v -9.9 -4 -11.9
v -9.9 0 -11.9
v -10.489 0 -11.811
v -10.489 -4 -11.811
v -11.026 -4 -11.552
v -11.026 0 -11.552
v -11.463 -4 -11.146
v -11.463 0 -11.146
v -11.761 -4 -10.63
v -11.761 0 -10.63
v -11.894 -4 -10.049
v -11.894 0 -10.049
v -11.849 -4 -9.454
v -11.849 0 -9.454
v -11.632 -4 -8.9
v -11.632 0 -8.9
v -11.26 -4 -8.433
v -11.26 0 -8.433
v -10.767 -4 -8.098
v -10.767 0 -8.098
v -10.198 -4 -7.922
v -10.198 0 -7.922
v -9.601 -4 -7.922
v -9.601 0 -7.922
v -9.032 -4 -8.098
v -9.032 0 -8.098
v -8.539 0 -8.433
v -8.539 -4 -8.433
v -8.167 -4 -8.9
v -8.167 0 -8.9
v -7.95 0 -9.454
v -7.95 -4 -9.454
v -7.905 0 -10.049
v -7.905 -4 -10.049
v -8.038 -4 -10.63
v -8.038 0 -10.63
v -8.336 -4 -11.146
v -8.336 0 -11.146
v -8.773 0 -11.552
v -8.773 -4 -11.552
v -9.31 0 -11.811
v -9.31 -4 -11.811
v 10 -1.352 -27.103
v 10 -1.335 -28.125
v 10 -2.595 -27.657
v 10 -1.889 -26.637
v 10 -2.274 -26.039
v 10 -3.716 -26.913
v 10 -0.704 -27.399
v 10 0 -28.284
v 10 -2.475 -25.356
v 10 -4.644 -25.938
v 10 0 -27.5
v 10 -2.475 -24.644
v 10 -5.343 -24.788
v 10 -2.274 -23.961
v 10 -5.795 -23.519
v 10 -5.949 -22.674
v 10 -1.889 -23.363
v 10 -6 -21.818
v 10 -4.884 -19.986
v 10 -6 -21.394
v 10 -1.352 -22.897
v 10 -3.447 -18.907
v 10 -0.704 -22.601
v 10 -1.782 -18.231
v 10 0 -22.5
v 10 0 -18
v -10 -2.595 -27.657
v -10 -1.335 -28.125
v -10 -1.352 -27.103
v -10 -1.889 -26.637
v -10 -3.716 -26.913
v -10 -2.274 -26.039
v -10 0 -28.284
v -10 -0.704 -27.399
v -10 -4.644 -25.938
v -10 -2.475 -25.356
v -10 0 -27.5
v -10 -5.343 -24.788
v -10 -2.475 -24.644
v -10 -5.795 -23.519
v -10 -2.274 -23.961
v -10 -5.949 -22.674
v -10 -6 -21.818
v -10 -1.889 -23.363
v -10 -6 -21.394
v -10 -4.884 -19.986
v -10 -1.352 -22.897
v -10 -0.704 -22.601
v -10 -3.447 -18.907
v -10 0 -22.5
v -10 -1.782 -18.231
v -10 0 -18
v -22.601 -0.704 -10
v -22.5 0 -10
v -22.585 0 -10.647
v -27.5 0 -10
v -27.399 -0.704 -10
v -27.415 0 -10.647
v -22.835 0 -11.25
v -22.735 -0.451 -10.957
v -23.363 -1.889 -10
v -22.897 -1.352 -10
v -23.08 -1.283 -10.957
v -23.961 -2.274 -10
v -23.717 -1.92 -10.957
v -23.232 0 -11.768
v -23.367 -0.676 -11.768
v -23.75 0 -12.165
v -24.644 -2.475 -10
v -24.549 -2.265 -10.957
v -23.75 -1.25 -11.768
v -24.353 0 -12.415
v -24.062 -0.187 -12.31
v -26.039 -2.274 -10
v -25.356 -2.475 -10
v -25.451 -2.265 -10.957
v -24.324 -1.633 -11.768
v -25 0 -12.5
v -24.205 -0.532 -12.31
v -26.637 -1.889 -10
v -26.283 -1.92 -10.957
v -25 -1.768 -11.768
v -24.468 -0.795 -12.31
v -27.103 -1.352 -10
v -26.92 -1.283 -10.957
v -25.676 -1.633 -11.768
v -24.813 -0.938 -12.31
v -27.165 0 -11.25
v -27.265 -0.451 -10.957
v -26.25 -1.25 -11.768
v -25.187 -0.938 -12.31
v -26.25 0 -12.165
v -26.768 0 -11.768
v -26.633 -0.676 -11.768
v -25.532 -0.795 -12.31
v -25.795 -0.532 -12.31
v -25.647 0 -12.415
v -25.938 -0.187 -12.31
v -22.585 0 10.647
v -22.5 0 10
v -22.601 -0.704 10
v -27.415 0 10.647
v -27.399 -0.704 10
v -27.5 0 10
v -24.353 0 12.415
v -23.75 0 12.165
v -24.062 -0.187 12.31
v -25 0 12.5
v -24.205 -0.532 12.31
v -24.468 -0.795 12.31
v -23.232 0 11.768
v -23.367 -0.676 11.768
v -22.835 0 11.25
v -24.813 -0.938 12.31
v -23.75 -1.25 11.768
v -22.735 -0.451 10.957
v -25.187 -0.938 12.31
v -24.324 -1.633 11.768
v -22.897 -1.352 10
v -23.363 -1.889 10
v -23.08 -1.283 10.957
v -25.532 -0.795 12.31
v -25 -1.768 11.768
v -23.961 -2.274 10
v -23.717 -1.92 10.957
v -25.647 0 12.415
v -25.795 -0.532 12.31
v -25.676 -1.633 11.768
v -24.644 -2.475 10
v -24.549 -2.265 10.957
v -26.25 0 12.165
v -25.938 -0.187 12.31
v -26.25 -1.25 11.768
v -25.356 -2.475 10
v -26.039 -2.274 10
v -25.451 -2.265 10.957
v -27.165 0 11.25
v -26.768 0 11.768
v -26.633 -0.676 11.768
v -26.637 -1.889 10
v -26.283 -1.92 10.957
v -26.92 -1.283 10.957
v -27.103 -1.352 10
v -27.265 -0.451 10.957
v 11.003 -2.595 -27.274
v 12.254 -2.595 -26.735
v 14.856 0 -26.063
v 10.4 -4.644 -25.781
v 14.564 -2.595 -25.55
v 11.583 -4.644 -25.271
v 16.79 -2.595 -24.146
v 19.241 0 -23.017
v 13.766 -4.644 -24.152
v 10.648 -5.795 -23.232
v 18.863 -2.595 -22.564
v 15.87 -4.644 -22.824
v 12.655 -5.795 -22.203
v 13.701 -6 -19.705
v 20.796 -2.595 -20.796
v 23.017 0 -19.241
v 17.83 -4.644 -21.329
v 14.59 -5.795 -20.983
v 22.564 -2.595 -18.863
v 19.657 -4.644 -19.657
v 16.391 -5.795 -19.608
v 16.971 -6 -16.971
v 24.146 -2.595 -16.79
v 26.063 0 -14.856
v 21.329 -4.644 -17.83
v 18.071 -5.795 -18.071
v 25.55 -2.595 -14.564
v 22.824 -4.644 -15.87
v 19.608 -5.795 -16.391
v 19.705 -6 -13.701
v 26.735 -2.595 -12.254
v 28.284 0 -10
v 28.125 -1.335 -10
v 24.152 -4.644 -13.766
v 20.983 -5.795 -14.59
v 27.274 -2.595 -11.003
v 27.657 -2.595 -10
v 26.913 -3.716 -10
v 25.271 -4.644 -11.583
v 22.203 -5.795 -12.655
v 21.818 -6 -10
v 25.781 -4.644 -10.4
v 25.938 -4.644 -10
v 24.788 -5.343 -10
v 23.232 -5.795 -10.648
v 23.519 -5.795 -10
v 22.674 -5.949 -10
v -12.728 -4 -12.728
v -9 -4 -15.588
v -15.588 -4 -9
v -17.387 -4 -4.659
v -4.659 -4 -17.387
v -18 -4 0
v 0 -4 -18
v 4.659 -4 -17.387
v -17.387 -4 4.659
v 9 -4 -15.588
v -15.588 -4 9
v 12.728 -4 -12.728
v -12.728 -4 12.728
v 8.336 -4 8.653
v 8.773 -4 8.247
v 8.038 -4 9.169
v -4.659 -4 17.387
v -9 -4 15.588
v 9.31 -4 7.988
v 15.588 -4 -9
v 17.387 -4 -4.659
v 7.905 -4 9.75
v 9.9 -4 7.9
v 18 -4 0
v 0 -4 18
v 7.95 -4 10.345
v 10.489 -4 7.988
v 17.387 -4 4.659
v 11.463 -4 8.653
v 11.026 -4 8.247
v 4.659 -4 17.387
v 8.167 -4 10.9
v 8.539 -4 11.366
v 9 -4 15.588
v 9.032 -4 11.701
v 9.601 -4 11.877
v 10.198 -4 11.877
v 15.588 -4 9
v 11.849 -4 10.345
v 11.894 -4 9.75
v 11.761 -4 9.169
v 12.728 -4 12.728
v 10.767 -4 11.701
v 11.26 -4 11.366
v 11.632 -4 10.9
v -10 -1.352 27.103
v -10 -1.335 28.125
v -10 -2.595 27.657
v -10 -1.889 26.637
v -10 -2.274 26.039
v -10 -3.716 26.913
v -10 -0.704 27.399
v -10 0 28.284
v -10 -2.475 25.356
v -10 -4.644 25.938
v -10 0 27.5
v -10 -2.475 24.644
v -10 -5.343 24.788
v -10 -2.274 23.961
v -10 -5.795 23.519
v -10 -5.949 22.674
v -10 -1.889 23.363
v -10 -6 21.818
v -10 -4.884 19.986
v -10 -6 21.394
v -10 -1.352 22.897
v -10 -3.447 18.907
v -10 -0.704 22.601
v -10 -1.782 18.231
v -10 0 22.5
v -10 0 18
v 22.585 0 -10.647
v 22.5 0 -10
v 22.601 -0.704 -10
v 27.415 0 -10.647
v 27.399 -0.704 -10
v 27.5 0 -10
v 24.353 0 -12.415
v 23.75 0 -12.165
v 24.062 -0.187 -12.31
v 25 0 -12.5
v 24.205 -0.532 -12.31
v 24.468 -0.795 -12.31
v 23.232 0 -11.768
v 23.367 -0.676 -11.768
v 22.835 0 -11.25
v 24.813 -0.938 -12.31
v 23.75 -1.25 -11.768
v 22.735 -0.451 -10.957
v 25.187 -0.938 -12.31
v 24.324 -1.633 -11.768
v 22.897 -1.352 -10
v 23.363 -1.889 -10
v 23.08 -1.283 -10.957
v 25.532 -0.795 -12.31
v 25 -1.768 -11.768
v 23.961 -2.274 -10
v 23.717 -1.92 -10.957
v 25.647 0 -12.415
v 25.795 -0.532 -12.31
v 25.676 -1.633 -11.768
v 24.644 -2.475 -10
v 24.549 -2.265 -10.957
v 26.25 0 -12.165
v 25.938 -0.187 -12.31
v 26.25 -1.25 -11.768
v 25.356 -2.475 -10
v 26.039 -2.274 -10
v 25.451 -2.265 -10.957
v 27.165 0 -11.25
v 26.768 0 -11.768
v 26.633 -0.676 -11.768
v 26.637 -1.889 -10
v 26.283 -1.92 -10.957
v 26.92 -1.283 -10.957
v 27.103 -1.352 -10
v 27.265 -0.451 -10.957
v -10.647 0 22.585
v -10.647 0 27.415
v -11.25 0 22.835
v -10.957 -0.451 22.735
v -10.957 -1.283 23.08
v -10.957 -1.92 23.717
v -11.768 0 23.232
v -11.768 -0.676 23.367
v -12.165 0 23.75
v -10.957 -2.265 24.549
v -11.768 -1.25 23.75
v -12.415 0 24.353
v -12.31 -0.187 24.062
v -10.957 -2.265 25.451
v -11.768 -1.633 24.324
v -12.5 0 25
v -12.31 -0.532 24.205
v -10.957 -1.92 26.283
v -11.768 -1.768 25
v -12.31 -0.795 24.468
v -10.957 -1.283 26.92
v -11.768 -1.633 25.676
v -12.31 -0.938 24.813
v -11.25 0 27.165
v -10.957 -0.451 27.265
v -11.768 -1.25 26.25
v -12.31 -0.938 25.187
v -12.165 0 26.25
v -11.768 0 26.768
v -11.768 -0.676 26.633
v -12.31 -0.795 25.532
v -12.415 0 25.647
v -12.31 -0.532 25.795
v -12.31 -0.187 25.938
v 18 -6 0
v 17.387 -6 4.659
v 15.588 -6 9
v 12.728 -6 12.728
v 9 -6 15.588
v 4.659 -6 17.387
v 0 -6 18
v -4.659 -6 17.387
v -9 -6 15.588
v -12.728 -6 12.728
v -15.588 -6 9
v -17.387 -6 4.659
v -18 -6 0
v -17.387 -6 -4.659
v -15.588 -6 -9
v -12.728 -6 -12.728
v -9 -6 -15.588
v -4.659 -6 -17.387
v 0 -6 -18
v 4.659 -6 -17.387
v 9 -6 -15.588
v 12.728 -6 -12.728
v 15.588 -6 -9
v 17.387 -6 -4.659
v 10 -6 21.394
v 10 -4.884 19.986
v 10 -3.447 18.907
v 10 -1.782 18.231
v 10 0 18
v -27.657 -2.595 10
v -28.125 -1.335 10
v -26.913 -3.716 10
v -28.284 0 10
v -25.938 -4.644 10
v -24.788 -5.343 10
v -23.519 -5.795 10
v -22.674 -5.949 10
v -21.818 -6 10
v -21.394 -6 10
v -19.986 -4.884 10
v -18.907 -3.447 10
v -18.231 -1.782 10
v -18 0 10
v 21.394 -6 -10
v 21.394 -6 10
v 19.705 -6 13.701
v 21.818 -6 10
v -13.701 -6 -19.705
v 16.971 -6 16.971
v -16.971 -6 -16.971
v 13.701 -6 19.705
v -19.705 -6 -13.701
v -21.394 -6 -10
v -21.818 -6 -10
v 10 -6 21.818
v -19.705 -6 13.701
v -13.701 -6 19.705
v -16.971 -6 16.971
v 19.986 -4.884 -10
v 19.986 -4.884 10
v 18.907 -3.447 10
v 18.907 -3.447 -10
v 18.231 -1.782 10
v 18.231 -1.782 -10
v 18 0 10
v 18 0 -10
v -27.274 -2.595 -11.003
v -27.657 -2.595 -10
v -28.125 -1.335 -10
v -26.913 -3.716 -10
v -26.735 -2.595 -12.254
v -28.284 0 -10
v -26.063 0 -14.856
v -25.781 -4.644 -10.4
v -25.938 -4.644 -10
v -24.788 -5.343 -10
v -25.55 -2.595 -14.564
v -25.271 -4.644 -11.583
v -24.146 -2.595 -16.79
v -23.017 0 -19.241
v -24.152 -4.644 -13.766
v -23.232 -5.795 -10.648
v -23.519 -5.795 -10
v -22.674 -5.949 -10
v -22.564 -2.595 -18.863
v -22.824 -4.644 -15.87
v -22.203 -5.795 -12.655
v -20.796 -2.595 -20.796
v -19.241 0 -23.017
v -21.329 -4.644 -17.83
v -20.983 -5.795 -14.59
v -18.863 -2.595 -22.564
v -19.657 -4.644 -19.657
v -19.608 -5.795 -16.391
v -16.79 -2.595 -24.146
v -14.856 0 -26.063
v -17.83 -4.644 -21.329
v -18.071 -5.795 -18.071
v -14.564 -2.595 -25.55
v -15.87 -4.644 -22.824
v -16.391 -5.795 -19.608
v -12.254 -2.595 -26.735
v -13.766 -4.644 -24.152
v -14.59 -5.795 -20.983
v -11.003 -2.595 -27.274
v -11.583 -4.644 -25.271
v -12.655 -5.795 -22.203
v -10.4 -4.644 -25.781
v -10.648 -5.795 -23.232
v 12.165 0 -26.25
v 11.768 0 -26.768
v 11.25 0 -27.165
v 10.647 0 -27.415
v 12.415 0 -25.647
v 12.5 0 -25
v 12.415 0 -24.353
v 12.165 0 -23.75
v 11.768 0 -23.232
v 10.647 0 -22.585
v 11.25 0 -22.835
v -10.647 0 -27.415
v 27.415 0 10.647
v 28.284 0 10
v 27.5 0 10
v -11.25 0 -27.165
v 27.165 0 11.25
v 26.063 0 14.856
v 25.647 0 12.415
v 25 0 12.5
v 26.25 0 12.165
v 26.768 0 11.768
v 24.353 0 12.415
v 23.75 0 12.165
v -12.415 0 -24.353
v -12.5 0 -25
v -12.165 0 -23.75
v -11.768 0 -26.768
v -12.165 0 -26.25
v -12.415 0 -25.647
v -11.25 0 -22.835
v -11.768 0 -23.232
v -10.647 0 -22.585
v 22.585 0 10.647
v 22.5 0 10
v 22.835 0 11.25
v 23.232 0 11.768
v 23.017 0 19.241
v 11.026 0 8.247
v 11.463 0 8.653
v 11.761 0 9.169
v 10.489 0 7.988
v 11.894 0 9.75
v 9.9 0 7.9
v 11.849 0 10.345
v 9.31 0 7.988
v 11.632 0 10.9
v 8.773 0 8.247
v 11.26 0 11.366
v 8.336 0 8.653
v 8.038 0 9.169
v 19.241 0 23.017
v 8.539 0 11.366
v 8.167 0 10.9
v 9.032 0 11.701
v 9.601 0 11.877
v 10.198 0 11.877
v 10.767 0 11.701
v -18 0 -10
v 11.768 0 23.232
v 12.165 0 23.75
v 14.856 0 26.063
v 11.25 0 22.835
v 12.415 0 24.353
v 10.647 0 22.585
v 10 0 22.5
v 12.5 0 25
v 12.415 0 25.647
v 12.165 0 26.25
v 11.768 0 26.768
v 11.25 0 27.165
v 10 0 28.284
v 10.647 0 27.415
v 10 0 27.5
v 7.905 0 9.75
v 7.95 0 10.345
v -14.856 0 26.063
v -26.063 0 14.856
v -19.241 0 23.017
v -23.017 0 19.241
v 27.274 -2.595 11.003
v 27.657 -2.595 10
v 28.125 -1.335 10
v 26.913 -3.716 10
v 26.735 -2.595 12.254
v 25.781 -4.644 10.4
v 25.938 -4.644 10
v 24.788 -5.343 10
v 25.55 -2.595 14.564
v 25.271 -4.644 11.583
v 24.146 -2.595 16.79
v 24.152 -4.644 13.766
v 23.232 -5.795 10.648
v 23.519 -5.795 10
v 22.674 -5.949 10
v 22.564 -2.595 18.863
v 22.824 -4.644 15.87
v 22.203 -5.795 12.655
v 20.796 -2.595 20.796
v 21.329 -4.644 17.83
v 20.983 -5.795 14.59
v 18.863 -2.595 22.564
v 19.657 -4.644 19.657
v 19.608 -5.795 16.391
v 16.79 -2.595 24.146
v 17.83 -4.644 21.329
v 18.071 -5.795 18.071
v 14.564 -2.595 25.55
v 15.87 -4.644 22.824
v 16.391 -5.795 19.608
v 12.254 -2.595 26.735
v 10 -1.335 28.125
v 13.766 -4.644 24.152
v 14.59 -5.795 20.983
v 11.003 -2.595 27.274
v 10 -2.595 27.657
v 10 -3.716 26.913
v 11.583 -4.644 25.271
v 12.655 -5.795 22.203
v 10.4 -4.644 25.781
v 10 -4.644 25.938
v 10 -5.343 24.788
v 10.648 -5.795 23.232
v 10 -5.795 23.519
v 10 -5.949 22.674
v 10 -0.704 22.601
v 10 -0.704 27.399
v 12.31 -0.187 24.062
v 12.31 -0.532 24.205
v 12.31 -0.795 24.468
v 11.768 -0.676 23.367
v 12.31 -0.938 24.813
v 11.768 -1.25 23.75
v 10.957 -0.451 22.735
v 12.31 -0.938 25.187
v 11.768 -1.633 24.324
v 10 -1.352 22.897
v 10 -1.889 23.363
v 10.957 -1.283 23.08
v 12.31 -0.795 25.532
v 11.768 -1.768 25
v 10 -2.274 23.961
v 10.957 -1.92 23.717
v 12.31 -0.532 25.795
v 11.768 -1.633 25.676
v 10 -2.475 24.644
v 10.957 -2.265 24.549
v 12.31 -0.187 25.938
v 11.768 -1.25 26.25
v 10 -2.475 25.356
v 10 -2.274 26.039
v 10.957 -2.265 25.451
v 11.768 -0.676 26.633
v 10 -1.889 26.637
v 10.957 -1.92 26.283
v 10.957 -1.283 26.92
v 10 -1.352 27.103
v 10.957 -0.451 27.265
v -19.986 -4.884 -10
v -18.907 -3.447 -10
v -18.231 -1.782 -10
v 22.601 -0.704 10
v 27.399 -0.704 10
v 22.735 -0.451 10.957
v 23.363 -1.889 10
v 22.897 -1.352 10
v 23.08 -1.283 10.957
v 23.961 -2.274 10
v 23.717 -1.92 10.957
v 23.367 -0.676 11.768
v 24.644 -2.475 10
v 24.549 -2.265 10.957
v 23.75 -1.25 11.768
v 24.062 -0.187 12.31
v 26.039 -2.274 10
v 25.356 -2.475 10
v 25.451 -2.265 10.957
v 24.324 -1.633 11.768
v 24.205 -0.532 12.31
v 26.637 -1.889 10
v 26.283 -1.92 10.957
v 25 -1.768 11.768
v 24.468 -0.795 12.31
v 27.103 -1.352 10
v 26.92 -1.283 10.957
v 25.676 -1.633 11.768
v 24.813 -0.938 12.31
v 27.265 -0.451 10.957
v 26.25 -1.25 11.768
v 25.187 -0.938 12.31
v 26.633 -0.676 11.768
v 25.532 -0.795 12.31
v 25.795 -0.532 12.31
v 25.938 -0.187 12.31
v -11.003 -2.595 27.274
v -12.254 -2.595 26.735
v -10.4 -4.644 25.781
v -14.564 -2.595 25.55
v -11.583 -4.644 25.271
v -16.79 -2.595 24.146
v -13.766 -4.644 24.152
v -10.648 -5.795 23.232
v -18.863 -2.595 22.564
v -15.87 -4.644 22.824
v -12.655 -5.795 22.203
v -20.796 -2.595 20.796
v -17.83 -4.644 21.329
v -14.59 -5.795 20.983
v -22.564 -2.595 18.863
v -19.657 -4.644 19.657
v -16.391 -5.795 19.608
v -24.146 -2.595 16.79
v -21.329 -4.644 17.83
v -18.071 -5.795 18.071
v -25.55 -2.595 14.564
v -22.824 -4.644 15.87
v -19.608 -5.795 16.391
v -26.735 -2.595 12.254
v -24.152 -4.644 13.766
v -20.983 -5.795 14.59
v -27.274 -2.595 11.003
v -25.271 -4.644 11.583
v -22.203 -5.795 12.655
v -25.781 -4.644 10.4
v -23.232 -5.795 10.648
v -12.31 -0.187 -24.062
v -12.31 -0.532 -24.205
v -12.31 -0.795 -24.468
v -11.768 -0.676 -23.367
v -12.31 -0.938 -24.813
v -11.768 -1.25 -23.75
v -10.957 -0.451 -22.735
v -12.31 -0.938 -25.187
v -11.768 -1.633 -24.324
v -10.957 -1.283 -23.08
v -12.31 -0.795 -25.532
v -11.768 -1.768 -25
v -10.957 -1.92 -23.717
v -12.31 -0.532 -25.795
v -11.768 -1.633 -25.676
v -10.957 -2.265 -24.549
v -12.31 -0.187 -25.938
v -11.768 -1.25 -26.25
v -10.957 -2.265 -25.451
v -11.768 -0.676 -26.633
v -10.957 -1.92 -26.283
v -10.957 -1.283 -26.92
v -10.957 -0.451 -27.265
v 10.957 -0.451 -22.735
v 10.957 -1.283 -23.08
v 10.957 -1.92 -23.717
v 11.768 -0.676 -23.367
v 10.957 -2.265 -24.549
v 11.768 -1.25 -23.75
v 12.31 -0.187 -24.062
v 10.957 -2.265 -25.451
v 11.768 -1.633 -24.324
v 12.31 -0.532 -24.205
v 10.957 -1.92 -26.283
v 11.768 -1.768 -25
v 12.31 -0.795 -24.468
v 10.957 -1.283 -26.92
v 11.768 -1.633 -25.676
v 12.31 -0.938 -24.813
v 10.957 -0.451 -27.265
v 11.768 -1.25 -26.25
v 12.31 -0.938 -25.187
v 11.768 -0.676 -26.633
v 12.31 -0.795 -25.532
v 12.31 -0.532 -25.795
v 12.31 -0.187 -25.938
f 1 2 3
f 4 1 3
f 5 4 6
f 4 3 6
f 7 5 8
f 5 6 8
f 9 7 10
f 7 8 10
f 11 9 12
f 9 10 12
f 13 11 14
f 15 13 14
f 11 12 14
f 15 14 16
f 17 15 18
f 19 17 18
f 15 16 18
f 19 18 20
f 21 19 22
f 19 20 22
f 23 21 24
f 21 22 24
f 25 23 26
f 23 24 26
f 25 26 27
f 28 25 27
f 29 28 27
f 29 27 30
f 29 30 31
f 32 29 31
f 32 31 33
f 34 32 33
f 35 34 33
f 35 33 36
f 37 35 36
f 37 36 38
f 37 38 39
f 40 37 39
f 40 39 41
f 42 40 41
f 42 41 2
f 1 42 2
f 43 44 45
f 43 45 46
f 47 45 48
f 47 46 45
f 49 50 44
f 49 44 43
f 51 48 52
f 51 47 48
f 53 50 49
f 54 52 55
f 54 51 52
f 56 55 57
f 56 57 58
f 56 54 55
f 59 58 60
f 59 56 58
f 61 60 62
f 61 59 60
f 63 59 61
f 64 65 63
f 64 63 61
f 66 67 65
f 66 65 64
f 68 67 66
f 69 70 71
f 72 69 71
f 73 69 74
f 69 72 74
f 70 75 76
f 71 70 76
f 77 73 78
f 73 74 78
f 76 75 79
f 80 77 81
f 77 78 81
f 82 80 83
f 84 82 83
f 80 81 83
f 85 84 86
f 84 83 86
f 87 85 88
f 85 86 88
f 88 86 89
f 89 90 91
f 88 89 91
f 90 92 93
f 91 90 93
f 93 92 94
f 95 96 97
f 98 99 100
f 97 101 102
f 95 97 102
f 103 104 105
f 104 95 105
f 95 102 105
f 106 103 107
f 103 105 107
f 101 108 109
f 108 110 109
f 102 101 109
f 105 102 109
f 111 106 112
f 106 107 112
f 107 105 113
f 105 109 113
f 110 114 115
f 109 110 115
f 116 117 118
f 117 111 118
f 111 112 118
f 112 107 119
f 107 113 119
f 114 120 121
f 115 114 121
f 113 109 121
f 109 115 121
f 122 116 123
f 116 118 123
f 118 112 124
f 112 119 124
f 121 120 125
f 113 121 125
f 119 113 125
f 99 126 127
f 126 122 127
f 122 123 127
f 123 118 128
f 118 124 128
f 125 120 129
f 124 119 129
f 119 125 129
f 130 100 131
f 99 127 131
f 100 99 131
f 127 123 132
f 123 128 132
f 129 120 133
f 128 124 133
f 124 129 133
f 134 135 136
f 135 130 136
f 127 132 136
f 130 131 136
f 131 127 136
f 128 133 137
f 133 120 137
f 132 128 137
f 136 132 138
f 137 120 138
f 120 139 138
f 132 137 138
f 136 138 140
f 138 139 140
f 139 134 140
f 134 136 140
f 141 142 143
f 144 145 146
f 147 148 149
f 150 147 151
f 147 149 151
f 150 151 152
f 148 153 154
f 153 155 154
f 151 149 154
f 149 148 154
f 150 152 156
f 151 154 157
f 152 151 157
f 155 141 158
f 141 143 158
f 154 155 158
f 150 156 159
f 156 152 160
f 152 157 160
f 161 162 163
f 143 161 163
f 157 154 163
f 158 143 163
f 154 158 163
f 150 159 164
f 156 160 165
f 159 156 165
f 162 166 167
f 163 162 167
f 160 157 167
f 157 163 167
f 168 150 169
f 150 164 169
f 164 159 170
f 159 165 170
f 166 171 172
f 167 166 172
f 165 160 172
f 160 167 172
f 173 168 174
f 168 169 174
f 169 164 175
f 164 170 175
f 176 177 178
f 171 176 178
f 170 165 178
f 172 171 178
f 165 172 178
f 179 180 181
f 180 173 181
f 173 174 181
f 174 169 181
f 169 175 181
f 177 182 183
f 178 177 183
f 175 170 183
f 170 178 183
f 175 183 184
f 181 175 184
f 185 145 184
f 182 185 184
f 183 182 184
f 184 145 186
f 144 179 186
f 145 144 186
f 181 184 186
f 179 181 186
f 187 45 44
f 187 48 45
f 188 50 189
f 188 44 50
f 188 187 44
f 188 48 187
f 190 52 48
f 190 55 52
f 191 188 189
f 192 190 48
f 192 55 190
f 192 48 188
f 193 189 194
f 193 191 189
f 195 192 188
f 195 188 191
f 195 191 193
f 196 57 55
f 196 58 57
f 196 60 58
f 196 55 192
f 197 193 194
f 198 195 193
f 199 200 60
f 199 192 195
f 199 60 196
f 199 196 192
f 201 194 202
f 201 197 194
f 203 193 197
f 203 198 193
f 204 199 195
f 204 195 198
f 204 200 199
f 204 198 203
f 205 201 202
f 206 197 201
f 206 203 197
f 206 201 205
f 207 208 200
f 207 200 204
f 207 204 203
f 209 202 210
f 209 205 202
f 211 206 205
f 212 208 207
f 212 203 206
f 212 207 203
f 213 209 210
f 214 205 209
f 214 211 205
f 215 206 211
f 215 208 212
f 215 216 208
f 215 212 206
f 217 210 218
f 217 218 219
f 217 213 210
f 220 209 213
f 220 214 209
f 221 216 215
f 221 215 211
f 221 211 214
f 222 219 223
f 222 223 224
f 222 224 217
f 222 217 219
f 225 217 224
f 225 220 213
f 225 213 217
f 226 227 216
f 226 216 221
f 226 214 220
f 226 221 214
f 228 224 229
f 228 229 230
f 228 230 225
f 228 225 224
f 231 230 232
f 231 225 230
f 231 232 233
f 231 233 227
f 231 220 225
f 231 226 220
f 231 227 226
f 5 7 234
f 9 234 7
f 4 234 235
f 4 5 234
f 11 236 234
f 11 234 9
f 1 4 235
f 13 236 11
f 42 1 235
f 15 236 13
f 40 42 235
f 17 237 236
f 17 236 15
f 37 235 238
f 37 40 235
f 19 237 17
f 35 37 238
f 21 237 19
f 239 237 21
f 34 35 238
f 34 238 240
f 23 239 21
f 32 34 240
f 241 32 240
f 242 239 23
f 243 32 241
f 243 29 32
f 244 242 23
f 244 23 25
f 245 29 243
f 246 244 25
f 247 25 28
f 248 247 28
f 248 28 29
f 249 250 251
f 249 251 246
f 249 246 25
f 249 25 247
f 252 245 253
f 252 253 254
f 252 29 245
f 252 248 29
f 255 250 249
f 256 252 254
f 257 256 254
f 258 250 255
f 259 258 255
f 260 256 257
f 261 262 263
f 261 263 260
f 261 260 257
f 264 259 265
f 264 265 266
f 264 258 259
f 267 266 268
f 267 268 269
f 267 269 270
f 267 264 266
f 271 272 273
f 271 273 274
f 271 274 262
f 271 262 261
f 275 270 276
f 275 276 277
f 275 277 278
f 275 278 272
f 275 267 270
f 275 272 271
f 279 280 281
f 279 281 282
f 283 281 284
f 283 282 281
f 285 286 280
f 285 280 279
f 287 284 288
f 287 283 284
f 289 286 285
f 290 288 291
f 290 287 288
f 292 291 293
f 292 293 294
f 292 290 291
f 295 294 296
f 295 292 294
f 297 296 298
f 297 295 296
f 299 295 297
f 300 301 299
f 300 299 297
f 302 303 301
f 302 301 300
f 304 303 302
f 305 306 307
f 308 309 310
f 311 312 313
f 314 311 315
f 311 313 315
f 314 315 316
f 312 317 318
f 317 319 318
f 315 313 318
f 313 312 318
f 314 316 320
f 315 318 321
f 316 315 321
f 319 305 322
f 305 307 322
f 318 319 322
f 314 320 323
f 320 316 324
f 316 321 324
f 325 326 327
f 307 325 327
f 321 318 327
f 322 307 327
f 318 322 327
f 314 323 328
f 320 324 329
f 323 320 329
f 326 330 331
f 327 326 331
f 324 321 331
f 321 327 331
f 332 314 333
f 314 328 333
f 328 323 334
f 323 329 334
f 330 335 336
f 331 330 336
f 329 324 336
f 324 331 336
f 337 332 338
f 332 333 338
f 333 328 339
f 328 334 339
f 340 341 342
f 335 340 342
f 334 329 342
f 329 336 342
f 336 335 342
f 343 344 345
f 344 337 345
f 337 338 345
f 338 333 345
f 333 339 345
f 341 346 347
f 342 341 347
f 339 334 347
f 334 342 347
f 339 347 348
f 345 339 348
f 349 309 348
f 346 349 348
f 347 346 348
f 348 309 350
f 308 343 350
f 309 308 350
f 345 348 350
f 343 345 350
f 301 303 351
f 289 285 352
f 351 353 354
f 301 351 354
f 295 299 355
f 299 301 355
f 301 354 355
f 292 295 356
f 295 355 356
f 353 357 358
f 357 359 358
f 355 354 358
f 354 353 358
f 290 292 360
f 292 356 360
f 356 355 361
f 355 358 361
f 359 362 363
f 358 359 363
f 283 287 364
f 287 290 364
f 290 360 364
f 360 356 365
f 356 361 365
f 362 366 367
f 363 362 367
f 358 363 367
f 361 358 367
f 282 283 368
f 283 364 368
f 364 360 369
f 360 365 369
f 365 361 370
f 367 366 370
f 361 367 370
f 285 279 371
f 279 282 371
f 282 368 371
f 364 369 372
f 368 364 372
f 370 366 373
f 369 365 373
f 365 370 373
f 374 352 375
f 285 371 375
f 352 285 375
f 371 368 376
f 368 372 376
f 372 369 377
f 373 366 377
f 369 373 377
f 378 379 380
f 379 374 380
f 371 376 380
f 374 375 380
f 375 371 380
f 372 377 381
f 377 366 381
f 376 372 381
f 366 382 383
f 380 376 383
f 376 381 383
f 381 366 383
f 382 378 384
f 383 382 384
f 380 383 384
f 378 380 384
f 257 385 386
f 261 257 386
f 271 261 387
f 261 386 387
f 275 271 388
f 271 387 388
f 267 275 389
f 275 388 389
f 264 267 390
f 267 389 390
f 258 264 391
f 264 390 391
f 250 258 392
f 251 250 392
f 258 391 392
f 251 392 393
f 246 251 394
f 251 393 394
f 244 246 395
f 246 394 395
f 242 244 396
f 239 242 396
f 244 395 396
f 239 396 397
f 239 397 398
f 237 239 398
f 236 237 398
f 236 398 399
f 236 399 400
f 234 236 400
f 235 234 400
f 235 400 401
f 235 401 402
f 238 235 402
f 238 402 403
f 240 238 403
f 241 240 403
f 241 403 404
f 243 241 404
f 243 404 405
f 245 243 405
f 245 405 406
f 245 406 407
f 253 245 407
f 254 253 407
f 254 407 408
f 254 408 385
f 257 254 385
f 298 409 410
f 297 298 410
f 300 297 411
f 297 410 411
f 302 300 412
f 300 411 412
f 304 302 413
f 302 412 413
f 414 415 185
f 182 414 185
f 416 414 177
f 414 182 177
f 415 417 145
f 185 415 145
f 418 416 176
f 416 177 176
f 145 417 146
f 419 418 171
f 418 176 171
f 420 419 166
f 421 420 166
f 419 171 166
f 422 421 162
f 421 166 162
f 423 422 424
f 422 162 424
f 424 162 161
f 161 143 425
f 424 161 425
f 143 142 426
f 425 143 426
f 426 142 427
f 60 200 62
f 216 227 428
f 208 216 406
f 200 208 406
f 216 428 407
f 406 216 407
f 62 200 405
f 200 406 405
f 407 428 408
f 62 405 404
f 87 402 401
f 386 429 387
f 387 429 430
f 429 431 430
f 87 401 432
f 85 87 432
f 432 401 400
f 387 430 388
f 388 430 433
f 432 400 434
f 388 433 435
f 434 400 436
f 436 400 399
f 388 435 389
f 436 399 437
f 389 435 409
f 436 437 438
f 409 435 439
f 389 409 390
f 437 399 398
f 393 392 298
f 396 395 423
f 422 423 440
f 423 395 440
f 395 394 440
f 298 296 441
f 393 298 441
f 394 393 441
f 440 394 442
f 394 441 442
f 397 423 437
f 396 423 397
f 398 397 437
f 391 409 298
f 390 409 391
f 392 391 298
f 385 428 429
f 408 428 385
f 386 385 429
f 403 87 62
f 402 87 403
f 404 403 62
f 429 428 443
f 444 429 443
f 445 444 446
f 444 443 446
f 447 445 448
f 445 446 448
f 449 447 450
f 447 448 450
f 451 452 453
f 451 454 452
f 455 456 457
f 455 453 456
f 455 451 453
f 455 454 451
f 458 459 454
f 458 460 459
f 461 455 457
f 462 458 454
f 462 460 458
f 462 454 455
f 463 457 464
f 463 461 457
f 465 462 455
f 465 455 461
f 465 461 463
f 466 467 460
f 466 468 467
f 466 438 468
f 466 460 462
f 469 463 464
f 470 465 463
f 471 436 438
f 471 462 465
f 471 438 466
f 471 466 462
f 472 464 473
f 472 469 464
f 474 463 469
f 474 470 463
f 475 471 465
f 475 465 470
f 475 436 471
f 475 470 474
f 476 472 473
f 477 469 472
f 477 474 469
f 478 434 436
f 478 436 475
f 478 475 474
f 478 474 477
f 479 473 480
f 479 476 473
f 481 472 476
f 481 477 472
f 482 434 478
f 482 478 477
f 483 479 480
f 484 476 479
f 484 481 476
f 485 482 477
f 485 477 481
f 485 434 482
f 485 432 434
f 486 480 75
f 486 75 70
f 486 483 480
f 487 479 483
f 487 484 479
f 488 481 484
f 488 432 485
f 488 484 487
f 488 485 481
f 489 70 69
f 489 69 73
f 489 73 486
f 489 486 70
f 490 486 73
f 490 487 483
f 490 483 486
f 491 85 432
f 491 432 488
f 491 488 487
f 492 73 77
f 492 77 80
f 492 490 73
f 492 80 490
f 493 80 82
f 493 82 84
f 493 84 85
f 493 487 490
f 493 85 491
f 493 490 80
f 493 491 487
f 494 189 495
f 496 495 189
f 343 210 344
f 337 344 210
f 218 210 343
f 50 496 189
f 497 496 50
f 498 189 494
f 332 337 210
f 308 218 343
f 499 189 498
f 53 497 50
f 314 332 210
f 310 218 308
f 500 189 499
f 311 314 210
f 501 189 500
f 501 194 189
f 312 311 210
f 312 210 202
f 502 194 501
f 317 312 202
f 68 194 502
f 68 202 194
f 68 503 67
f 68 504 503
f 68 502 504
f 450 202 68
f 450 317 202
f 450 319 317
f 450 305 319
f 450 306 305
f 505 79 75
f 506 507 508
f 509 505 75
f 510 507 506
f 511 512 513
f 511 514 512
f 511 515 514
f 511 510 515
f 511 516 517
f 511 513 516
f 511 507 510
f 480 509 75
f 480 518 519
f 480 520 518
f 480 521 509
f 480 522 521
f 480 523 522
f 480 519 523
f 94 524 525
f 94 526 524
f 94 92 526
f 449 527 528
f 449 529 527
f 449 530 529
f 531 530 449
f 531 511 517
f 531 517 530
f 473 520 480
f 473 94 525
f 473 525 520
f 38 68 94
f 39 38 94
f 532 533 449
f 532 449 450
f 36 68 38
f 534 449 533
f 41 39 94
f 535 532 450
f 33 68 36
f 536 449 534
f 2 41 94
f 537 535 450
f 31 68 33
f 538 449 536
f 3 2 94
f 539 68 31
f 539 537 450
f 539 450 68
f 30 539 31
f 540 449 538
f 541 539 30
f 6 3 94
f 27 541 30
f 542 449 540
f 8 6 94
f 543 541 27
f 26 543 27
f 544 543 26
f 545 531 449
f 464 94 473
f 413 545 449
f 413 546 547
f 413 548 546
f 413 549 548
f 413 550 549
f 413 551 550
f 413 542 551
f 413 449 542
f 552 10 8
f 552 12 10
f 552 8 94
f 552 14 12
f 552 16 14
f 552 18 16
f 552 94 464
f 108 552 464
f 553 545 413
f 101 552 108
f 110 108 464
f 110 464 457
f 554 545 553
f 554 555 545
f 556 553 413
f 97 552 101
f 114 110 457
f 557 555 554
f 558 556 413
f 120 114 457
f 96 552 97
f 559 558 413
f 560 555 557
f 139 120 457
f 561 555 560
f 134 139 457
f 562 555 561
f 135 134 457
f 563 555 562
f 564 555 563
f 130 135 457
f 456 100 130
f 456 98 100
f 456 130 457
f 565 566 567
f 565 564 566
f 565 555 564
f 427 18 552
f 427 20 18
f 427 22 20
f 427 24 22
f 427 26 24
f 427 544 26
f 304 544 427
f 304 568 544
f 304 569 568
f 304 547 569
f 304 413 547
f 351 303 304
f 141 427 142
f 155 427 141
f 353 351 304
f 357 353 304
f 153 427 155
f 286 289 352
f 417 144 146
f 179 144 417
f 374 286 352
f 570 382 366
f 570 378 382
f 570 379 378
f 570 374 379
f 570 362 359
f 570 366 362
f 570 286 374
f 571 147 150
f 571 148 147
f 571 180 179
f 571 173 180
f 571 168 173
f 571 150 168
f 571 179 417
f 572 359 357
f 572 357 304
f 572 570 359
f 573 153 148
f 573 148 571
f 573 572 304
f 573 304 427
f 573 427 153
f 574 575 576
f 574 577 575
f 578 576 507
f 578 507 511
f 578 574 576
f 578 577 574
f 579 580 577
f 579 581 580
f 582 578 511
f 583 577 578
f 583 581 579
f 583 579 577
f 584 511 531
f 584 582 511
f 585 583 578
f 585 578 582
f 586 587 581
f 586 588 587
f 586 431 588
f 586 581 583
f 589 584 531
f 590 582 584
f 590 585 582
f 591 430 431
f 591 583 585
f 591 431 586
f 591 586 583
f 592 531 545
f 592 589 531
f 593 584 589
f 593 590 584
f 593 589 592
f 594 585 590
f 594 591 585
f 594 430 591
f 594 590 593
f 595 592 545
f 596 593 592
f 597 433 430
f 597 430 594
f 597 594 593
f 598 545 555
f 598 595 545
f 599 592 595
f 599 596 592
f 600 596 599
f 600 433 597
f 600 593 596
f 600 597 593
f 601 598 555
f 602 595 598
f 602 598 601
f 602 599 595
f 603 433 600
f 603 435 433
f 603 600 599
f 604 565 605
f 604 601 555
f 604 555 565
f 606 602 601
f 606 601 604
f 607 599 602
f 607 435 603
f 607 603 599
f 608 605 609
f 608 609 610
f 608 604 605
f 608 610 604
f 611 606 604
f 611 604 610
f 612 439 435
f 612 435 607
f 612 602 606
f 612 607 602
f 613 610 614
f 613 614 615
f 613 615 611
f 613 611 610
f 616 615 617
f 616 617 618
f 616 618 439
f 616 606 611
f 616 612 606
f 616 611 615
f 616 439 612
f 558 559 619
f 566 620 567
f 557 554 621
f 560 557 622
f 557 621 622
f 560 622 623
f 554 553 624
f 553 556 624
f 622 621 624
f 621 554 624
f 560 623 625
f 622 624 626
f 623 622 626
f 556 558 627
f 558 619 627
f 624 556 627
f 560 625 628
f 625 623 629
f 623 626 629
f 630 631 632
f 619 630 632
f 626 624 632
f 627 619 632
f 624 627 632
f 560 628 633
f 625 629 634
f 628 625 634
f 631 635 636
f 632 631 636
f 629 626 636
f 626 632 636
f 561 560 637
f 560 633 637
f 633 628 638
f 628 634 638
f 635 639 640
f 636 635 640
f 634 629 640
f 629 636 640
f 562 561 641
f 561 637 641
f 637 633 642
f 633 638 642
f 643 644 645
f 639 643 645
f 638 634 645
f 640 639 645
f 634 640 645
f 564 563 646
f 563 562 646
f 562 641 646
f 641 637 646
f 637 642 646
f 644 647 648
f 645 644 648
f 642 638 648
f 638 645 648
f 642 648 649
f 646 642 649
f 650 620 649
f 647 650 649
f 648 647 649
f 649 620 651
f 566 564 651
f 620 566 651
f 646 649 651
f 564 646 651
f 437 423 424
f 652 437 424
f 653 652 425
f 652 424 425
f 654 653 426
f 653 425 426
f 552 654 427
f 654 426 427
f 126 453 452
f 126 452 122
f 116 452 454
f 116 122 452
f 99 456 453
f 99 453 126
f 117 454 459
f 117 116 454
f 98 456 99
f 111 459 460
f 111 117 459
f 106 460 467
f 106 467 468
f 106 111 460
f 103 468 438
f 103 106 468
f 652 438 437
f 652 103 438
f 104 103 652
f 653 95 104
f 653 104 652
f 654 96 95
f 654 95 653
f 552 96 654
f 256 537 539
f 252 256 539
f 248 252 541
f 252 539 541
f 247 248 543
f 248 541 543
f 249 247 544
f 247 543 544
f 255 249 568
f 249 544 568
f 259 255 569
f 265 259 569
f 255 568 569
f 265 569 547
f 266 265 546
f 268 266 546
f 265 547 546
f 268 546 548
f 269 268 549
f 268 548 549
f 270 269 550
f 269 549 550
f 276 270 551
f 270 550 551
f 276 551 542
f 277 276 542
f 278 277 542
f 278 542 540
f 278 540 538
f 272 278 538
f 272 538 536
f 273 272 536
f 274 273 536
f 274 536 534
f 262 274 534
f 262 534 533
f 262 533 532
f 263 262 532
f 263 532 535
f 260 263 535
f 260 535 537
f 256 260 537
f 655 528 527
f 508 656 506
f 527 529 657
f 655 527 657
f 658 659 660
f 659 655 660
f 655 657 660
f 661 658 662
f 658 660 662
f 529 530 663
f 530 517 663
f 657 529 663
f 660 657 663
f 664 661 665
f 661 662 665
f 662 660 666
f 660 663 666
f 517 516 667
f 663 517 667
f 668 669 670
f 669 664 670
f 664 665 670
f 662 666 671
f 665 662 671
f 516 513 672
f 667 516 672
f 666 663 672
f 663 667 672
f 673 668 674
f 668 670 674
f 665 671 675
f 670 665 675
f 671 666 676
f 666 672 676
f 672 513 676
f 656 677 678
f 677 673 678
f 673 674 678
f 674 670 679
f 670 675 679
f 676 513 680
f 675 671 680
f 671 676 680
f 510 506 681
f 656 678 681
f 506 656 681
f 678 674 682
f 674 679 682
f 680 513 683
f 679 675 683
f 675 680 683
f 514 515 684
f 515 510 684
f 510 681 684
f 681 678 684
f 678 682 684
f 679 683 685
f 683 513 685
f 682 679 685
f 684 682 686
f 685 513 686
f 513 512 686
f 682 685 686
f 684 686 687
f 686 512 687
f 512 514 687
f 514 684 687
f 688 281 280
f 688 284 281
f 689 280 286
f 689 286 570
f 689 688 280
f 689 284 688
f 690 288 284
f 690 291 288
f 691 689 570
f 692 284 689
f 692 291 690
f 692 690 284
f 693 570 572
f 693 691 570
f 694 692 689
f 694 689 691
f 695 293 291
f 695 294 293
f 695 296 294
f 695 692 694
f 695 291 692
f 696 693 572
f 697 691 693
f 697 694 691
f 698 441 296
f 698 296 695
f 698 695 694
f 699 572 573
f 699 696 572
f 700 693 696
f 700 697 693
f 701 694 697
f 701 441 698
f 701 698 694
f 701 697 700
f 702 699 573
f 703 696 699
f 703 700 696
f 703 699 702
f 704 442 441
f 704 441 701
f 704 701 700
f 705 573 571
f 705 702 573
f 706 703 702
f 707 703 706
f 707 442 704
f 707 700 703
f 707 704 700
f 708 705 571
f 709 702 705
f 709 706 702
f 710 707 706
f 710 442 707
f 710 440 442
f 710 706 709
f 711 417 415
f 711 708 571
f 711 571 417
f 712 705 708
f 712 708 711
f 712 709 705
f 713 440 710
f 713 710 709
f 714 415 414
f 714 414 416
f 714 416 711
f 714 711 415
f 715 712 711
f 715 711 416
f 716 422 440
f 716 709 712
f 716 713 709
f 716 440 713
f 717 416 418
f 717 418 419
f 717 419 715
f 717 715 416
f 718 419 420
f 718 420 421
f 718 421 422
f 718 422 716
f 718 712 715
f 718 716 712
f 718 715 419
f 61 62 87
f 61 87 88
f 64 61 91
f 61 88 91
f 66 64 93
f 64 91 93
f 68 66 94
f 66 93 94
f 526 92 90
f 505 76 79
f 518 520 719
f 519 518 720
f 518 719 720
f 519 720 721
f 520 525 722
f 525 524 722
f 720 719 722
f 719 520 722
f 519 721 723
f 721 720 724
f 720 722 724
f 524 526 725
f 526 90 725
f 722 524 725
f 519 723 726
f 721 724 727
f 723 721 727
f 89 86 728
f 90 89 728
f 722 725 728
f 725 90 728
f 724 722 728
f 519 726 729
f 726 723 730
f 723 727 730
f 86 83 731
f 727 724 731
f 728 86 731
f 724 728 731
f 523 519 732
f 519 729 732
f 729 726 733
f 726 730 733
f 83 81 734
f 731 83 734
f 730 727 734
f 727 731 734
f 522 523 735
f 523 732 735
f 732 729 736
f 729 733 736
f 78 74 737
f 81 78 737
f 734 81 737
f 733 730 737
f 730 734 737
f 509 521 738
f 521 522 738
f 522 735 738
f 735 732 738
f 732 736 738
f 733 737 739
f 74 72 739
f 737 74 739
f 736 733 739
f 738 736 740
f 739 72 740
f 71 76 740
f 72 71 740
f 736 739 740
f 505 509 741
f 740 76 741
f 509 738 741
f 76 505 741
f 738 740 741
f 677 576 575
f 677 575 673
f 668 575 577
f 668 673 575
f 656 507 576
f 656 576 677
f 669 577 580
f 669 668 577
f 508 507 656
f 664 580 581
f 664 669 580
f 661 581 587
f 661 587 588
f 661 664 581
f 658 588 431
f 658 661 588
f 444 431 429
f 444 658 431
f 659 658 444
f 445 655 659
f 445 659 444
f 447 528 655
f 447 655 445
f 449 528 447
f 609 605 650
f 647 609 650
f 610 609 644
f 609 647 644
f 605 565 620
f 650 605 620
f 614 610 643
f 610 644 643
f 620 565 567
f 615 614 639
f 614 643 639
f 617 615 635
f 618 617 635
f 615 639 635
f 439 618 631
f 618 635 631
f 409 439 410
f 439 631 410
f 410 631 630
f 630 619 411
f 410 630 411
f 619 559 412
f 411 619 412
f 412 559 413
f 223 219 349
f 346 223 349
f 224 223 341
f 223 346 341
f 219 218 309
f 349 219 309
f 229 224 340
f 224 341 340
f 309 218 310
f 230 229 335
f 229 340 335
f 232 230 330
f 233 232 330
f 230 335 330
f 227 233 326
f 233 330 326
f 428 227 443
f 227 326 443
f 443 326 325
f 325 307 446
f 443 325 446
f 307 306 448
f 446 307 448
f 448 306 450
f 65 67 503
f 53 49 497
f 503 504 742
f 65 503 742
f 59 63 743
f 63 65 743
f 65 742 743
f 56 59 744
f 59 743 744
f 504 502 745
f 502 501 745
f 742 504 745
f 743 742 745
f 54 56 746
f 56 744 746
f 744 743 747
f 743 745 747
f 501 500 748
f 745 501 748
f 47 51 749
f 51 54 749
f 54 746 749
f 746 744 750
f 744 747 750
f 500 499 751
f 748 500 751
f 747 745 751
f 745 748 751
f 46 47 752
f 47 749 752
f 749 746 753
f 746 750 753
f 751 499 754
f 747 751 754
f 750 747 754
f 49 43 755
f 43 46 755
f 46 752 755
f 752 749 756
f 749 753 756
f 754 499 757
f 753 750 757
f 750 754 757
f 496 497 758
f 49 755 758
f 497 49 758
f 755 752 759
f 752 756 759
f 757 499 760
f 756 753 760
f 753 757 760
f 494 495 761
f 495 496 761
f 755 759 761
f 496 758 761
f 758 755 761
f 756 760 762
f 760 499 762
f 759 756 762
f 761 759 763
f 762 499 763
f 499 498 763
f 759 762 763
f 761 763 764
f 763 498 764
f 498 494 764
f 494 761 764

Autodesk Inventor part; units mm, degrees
ref_plane "YZ Plane" through (0, 0, 0) normal (1, 0, 0) x (0, 1, 0)
ref_plane "XZ Plane" through (0, 0, 0) normal (0, 1, 0) x (-1, 0, 0)
ref_plane "XY Plane" through (0, 0, 0) normal (0, 0, 1) x (1, 0, 0)
sketch "Sketch1" plane through (0, 0, 0) normal (0, 1, 0) x (-1, 0, 0)
  circle A0 centre (0, 0) radius 30
  dimension "d0" = 60
extrude "Extrusion1" add sketch "Sketch1" against normal blind 6
sketch "Sketch2" plane through (0, 0, 0) normal (0, 1, 0) x (1, 0, 0)
  line L0 (-10, -18) -> (10, -18)
  line L1 (10, -32) -> (-10, -32)
  line L2 (-10, -18) -> (10, -32) construction
  line L3 (10, -18) -> (-10, -32) construction
  arc A0 (-7.5, -25) -> (-12.5, -25) centre (-10, -25) ccw
  arc A1 (12.5, -25) -> (7.5, -25) centre (10, -25) ccw
  line L4 (-12.5, -25) -> (12.5, -25)
  line L5 (-10, -32) -> (-10, -27.5)
  line L6 (-10, -25) -> (-10, -18)
  line L7 (10, -18) -> (10, -25)
  line L8 (10, -27.5) -> (10, -32)
  point P0 (0, 0)
  point P1 (0, -25)
  dimension "d3" = 20
  dimension "d4" = 25
  dimension "d5" = 14
  dimension "d6" = 5
  dimension "d7" = 5
revolve "Revolution1" cut sketch "Sketch2" angle 360 about axis through (-12.5, 0, 25) along (1, 0, 0)
sketch "Sketch3" plane through (0, -6, 0) normal (0, -1, 0) x (1, 0, 0)
  arc A0 (9.04, 28.6056) -> (-9.04, 28.6056) centre (0, 0) ccw projected
  line L0 (-9.04, 28.6056) -> (9.04, 28.6056) projected
  arc A1 (9.04, 28.6056) -> (-9.04, 28.6056) centre (0, 0) ccw projected
extrude "Extrusion2" cut sketch "Sketch3" against normal through all
fillet "Fillet1" radius 6 1 edges at (0, -6, -30)
pattern_circular "Circular Pattern1" count 4 over 360 about axis through (0, -10, 0) along (0, 1, 0) of "Revolution1"
sketch "Sketch4" plane through (0, -6, 0) normal (0, -1, 0) x (1, 0, 0)
  circle A0 centre (0, 0) radius 18
  dimension "d15" = 36
extrude "Extrusion3" cut sketch "Sketch4" against normal blind 2
sketch "Sketch5" plane through (0, -4, 0) normal (0, -1, 0) x (1, 0, 0)
  circle A0 centre (0, 0) radius 18 projected
  line L0 (0, 0) -> (18, 0)
  line L1 (0, 0) -> (9.8995, 9.8995)
  line L2 (0, 0) -> (-9.8995, -9.8995)
  dimension "d19" = 45
  dimension "d20" = 14
  dimension "d21" = 14
  dimension "d22" = 180
hole "Hole1" at (9.8995, -4, 9.8995) at (-9.8995, -4, -9.8995) direction (0, 1, 0) diameter 4 end through all
properties part number "wheel_cover_in"
